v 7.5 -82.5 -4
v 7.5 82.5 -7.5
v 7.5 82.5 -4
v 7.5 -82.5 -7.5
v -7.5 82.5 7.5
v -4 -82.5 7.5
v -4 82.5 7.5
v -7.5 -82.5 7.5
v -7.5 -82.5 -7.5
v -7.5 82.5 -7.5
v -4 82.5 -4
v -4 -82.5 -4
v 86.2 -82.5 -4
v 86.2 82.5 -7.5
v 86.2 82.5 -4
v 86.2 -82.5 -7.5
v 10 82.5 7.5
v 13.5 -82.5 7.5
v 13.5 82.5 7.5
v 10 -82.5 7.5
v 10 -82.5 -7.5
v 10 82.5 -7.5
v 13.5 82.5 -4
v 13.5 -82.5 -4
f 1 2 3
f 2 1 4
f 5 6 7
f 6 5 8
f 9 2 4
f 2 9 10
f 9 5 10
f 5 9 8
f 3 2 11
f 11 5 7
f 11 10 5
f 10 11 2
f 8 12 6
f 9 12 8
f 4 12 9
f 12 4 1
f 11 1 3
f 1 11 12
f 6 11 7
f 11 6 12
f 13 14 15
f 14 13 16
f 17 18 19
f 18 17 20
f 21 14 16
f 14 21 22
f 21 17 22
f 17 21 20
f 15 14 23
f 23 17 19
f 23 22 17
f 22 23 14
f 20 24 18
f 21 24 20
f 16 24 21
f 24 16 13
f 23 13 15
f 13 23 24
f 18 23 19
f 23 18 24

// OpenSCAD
small_width =15;
length = 165;
thick = 4;
large_width = 3*25.4;

difference(){
cube([small_width, length,small_width,], center=true);
translate([thick, 0, thick])cube([small_width+1, length+1,small_width+1,], center=true);
}


translate([10+large_width/2,0,0])difference(){
cube([large_width, length,small_width,], center=true);
translate([thick, 0, thick])cube([large_width+1, length+1,small_width+1,], center=true);
}
